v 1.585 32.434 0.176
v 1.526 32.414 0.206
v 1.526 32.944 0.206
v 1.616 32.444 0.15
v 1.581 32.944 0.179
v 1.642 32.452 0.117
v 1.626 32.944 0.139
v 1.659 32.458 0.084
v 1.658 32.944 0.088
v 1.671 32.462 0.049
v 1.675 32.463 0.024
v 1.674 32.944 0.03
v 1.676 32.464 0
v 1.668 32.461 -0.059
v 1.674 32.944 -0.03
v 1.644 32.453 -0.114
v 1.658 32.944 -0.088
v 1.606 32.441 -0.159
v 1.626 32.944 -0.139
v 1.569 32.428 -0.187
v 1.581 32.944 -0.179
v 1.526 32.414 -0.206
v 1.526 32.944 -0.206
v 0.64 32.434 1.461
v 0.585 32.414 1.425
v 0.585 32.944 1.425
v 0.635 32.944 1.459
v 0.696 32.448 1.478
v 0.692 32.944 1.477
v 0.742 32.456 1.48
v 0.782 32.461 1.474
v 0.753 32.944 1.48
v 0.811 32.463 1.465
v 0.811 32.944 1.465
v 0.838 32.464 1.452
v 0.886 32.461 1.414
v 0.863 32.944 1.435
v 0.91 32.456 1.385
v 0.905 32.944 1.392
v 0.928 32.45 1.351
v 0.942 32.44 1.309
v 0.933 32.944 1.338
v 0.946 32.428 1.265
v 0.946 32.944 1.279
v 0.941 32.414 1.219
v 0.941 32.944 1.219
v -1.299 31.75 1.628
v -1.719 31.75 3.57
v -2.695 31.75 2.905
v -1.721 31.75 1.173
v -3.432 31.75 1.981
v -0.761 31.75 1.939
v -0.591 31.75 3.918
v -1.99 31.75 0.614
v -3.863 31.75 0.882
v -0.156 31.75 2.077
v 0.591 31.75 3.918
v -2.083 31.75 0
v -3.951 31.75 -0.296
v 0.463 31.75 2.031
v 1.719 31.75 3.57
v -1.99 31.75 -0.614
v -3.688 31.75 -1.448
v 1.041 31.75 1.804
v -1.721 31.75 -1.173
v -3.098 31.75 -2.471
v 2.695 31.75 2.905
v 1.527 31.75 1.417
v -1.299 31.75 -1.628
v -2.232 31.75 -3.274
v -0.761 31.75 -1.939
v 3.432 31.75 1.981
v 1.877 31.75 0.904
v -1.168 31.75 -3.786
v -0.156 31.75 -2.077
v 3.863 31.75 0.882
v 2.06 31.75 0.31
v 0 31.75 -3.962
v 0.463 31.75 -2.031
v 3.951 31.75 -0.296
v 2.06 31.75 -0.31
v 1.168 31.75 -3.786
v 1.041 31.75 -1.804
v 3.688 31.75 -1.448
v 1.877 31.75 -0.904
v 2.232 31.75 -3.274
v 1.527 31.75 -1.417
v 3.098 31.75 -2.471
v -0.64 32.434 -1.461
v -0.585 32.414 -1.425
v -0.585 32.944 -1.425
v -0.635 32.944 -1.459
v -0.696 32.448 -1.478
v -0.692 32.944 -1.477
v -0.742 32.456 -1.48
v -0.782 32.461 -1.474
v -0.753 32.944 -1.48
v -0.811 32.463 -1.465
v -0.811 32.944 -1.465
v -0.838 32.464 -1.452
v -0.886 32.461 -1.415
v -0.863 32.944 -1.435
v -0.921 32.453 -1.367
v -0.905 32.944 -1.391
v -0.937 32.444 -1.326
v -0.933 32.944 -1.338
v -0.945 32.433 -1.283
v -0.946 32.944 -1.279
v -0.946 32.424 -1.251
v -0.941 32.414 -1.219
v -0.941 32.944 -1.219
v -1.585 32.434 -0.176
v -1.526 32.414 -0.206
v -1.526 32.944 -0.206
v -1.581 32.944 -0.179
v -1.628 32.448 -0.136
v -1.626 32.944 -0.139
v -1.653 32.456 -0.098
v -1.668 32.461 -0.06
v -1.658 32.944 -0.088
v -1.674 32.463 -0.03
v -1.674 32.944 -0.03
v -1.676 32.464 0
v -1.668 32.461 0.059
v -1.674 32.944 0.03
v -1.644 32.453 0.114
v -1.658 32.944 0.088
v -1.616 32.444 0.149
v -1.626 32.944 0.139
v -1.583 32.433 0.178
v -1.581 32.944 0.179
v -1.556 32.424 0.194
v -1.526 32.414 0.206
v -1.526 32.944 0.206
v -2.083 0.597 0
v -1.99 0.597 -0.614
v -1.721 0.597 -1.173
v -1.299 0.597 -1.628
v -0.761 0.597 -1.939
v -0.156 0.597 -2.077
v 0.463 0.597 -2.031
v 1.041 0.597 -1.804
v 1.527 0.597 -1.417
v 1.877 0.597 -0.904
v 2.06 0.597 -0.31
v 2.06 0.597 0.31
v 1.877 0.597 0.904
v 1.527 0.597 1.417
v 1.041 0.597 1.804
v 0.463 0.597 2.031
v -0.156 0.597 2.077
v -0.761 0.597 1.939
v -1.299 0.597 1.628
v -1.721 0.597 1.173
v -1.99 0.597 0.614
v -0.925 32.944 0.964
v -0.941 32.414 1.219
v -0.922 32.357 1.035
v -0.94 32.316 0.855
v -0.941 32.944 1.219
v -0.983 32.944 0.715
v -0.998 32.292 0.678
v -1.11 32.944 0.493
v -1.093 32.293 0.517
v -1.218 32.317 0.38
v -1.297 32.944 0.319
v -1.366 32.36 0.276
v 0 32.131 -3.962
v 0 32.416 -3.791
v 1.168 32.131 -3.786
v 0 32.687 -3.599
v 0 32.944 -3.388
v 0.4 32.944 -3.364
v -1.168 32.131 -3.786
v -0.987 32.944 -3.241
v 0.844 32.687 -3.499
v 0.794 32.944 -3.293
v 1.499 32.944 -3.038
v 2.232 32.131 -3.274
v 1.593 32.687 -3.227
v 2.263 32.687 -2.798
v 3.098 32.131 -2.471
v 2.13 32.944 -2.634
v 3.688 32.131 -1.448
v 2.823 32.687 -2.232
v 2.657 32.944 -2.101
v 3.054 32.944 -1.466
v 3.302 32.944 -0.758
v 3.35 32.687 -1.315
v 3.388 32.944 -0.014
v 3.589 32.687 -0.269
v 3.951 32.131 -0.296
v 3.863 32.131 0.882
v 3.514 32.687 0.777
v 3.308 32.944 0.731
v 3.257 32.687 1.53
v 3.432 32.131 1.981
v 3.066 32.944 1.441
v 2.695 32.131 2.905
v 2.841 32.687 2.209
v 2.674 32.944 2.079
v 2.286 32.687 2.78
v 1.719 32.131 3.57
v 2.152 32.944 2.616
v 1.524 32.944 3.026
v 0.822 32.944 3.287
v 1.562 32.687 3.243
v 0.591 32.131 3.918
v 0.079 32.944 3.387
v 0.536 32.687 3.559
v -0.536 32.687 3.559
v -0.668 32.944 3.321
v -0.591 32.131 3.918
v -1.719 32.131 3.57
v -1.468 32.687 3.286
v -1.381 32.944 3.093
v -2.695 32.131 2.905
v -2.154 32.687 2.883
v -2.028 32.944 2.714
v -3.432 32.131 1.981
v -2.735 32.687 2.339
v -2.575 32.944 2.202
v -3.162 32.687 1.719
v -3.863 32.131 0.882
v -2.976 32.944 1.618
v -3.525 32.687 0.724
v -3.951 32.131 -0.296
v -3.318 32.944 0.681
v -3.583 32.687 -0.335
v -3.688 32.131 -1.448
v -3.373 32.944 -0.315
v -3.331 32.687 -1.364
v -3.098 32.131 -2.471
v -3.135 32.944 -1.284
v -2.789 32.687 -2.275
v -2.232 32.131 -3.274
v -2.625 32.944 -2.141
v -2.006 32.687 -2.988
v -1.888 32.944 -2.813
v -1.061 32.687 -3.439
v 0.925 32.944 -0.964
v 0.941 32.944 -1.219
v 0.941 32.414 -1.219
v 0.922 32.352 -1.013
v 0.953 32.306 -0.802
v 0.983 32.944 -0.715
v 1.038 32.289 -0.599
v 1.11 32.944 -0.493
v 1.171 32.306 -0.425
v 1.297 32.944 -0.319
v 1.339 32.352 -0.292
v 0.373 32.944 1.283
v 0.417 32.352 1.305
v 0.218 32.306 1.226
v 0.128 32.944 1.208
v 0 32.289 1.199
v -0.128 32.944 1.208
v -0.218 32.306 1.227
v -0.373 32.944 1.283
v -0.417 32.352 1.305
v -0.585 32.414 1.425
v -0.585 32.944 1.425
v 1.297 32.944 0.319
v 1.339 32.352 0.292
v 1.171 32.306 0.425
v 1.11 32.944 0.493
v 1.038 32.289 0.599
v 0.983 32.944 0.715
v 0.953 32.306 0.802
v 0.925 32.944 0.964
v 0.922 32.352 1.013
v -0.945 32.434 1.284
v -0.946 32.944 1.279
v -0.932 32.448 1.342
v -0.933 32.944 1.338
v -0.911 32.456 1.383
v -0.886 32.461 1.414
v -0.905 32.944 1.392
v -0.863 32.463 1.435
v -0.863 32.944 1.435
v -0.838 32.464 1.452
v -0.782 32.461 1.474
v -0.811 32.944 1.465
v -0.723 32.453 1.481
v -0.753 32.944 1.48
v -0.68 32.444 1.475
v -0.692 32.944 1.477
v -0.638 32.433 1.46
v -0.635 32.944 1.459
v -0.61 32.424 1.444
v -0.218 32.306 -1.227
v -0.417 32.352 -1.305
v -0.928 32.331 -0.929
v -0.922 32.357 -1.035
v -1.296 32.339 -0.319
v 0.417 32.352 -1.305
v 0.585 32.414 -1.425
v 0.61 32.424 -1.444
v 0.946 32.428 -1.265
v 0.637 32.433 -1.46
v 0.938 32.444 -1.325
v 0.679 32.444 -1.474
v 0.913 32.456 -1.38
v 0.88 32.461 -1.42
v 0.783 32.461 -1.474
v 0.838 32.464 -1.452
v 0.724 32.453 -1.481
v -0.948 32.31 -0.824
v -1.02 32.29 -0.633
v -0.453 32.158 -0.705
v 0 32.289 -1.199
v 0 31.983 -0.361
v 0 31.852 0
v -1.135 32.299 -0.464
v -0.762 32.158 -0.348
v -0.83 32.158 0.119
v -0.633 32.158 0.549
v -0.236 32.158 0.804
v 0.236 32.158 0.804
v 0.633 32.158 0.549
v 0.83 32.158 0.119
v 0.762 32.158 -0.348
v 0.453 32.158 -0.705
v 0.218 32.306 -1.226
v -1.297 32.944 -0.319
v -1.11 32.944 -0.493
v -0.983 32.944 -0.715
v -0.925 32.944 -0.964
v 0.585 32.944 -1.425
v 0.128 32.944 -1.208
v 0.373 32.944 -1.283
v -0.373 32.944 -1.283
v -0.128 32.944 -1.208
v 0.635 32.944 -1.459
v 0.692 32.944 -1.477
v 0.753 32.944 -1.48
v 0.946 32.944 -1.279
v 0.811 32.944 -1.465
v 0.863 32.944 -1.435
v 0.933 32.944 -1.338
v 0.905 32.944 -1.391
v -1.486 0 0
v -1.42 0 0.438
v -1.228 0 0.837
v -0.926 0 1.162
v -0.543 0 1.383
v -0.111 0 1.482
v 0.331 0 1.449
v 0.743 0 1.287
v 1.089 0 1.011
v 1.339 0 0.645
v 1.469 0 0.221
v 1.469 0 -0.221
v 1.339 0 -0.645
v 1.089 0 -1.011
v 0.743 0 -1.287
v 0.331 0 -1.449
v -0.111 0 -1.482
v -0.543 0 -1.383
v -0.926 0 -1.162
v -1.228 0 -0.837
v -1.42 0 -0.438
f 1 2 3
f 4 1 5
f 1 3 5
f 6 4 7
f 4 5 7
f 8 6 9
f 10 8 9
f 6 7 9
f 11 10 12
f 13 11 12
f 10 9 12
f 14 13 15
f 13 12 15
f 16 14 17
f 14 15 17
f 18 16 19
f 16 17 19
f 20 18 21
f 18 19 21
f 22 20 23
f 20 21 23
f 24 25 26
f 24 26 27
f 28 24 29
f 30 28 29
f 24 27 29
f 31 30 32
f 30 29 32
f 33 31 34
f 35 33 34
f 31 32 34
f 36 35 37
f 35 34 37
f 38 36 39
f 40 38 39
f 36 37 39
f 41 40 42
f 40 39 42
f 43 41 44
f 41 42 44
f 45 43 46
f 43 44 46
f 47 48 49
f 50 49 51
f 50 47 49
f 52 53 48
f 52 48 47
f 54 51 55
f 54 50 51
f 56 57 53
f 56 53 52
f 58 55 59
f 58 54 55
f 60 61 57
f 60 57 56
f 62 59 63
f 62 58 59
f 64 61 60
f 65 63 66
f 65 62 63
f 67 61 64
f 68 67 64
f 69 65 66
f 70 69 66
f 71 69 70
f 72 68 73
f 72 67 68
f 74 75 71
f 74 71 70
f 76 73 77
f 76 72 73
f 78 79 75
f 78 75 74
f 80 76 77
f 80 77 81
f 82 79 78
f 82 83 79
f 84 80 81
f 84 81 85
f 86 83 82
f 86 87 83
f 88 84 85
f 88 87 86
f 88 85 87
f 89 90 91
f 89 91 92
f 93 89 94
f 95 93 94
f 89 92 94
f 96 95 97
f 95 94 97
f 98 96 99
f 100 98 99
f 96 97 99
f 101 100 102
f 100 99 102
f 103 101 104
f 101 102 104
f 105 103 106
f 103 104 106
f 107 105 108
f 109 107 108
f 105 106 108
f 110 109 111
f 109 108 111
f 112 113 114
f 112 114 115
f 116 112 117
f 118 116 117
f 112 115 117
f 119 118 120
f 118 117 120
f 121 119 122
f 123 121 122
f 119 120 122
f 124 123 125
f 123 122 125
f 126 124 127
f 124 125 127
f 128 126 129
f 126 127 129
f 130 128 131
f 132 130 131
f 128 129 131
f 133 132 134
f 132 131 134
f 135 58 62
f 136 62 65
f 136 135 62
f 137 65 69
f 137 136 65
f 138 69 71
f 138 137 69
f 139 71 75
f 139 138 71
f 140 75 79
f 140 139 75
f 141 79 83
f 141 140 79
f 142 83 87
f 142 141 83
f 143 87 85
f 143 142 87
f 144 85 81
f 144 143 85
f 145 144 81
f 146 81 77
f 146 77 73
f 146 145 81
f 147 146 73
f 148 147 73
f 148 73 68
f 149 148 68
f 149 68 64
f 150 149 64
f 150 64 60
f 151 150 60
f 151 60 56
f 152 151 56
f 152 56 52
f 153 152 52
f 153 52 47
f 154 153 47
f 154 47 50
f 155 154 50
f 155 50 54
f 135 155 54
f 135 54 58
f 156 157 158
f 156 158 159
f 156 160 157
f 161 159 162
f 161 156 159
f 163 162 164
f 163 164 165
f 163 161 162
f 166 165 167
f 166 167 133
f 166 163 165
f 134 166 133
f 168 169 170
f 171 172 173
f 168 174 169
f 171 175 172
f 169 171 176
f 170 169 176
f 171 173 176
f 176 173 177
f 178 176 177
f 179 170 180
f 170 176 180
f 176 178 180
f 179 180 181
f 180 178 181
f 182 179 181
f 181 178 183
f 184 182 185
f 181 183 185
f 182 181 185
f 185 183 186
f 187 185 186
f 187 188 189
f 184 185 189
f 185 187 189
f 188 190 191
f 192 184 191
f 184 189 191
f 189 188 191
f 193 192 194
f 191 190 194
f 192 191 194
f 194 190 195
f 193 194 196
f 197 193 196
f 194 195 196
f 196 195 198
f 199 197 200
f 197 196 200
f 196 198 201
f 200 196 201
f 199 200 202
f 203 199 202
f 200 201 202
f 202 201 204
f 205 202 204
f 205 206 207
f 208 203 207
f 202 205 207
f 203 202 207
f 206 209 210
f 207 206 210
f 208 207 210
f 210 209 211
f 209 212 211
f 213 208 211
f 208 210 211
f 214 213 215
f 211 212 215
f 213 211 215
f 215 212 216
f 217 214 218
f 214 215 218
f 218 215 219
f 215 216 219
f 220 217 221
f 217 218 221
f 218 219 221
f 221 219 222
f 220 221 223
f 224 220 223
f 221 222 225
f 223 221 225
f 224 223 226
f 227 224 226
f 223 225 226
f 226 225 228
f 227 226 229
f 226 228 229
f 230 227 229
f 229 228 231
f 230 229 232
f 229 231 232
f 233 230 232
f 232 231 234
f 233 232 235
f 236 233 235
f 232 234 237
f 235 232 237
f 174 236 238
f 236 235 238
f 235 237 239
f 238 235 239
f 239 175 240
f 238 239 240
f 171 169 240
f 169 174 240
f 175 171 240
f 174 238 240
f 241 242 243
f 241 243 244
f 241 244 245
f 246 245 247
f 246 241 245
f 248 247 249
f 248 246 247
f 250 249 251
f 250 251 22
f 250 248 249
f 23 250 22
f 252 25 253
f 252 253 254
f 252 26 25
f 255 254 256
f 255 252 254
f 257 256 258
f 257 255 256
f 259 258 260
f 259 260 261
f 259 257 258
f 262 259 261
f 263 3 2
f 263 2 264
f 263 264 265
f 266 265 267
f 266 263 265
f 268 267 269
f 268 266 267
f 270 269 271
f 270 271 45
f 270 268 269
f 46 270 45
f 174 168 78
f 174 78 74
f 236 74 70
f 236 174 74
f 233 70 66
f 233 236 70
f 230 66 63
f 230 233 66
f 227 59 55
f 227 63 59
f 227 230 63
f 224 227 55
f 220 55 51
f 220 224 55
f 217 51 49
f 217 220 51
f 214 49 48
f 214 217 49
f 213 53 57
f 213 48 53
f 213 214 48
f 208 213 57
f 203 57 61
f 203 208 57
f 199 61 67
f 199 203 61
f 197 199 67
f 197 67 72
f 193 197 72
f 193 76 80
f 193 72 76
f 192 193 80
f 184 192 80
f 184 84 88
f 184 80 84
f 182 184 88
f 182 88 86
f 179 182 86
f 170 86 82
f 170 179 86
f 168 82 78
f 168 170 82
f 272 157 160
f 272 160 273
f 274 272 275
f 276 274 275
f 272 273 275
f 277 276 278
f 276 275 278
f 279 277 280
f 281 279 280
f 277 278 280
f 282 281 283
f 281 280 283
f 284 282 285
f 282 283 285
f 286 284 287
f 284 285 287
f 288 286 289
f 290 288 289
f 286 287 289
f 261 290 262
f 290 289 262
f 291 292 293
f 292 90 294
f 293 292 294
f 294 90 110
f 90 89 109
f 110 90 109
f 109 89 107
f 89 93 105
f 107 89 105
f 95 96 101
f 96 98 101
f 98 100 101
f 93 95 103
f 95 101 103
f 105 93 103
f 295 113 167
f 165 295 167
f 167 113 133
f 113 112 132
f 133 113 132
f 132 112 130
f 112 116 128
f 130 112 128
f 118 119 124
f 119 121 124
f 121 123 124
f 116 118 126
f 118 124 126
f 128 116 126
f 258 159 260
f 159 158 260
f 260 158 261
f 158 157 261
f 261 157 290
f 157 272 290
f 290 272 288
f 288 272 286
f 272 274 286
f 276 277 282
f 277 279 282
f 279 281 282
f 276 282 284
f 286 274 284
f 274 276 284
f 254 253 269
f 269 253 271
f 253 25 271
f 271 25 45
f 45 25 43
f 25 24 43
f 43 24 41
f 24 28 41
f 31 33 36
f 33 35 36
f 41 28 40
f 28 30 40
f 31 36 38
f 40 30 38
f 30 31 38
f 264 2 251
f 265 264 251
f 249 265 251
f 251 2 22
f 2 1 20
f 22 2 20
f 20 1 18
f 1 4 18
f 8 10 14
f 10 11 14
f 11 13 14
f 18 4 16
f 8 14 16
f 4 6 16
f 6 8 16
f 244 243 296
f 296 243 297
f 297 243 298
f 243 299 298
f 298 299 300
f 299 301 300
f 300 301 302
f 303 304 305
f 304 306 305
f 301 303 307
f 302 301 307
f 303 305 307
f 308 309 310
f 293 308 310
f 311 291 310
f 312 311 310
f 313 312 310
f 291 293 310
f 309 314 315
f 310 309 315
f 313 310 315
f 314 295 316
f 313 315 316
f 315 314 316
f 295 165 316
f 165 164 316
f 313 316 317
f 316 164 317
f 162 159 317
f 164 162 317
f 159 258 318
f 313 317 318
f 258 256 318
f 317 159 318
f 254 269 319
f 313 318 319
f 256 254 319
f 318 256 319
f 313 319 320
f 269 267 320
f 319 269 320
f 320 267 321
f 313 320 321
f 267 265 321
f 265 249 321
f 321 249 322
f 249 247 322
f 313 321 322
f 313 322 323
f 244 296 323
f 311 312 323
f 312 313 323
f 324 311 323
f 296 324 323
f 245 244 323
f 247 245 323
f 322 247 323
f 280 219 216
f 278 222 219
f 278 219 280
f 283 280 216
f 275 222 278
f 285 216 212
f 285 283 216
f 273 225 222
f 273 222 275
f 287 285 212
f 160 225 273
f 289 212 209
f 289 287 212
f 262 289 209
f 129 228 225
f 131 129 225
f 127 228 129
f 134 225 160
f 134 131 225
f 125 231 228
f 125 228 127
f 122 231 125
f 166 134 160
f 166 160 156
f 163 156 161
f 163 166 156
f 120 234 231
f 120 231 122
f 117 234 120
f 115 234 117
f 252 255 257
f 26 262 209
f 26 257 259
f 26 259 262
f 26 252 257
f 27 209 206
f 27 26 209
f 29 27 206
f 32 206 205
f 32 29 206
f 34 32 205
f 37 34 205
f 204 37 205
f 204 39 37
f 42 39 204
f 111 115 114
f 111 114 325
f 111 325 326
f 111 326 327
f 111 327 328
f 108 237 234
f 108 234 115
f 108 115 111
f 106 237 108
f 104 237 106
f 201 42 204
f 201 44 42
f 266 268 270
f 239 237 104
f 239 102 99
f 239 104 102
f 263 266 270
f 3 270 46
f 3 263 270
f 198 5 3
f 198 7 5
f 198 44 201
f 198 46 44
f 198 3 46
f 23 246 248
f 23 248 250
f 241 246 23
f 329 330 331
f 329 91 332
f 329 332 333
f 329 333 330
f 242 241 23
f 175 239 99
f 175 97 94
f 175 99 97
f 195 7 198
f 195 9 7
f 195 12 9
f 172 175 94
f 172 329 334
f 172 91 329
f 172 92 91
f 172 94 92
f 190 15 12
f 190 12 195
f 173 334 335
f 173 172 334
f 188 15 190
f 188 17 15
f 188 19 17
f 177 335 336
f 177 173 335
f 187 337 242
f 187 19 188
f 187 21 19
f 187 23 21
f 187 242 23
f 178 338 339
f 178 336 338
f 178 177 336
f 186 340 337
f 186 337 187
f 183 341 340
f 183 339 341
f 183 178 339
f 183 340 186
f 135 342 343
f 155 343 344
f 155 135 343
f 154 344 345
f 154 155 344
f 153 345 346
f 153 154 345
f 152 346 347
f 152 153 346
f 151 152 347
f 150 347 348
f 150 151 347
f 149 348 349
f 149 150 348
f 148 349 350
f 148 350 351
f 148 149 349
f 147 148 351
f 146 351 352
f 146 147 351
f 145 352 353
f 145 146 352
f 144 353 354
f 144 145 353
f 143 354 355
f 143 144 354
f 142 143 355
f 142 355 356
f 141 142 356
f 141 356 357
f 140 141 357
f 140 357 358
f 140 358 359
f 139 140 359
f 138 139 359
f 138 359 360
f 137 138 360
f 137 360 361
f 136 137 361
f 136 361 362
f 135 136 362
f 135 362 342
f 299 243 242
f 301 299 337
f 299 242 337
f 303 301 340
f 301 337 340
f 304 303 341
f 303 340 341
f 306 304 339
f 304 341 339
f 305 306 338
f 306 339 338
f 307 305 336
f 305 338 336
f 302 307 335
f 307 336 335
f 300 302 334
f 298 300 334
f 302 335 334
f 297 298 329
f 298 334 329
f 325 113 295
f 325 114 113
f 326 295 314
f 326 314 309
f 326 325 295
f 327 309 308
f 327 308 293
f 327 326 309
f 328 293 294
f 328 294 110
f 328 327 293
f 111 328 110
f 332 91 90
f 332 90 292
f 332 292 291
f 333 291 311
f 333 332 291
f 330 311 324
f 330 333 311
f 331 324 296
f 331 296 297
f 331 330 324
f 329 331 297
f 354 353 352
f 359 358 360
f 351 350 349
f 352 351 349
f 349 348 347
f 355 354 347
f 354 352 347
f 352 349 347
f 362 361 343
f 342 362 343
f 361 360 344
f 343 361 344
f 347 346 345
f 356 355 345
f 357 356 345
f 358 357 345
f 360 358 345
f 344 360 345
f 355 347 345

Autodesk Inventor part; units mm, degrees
ref_plane "YZ Plane" through (0, 0, 0) normal (1, 0, 0) x (0, 1, 0)
ref_plane "XZ Plane" through (0, 0, 0) normal (0, 1, 0) x (-1, 0, 0)
ref_plane "XY Plane" through (0, 0, 0) normal (0, 0, 1) x (1, 0, 0)
sketch "Sketch1" plane through (0, 0, 0) normal (0, 1, 0) x (-1, 0, 0)
  circle A0 centre (0, 0) radius 2.0828
  dimension "d4" = 4.1656
extrude "Body" add sketch "Sketch1" along normal blind 31.75
sketch "Sketch2" plane through (0, 0, 0) normal (1, 0, 0) x (0, 1, 0)
  line L0 (31.75, -2.0828) -> (31.75, 2.0828) projected
  line L1 (31.75, 0) -> (31.75, -3.9624)
  line L2 (31.75, -3.9624) -> (32.131, -3.9624)
  arc A0 (32.131, -3.9624) -> (33.9598, -2.0828) centre (29.9388, 0) ccw
  line L3 (33.9598, -2.0828) -> (33.9598, -1.6764)
  line L4 (33.9598, -1.6764) -> (32.4635, -1.6764)
  line L5 (32.4635, -1.6764) -> (31.8516, 0)
  line L6 (31.8516, 0) -> (31.75, 0)
  point P0 (0, 0)
  dimension "d5" = 3.9624
  dimension "d6" = 0.381
  dimension "d13" = 0.1016
  dimension "d14" = 2.0828
  dimension "d15" = 2.2098
  dimension "d16" = 0
  dimension "d17" = 1.6764
  dimension "d57" = 20.053
revolve "Head" add sketch "Sketch2" angle 360 about axis through (0, 31.8516, 0) along (0, -1, 0)
sketch "Sketch3" plane through (0, 33.9598, 0) normal (0, 1, 0) x (1, 0, 0)
  circle A0 centre (0, 0) radius 1.6764 projected
  line L0 (0.7302, -1.2648) -> (-0.7303, -1.2648) construction
  line L1 (-0.7303, -1.2648) -> (-1.4605, 0) construction
  line L2 (-1.4605, 0) -> (-0.7303, 1.2648) construction
  line L3 (-0.7303, 1.2648) -> (0.7302, 1.2648) construction
  line L4 (0.7302, 1.2648) -> (1.4605, 0) construction
  line L5 (1.4605, 0) -> (0.7302, -1.2648) construction
  circle A1 centre (-0.7303, -1.2648) radius 0.2159
  circle A2 centre (-1.4605, 0) radius 0.2159
  circle A3 centre (-0.7303, 1.2648) radius 0.2159
  circle A4 centre (0.7302, 1.2648) radius 0.2159
  circle A5 centre (1.4605, 0) radius 0.2159
  circle A6 centre (0.7302, -1.2648) radius 0.2159
  circle A7 centre (0, -2.0701) radius 0.8712
  circle A8 centre (0, 2.0701) radius 0.8712
  circle A9 centre (1.7928, -1.0351) radius 0.8712
  circle A10 centre (-1.7928, 1.035) radius 0.8712
  circle A11 centre (1.7928, 1.035) radius 0.8712
  circle A12 centre (-1.7928, -1.0351) radius 0.8712
  circle A13 centre (0, 0) radius 1.8188
  point P0 (0, 0)
  point P1 (0, 0)
  point P2 (0.9413, 1.2192)
  point P3 (1.5265, 0.2056)
  point P4 (1.5265, -0.2056)
  point P5 (0.9413, -1.2192)
  point P6 (0.5852, -1.4248)
  point P7 (-0.5852, -1.4248)
  point P8 (-0.9413, -1.2192)
  point P9 (-1.5265, -0.2056)
  point P10 (-1.5265, 0.2056)
  point P11 (-0.9413, 1.2192)
  point P12 (-0.5852, 1.4248)
  point P13 (0.5852, 1.4248)
  dimension "d58" = 2.921
  dimension "d59" = 4.1402
  dimension "d62" = 120
extrude "Hex" add sketch "Sketch3" against normal blind 1.778 contours A5 A11 A0 | A0 A11 A13 A9 | A0 A9 A5 | A11 A0 | A0 A11 A13 | A9 A13 A0 | A0 A9 | A11 A4 A0 | A0 A8 A13 A11 | A9 A13 A7 A0 | A0 A6 A9 | A4 A8 A0 | A0 A7 A6 | A8 A0 | A7 A0 | A0 A8 A13 | A7 A13 A0 | A3 A0 A8 | A7 A0 A1 | A0 A10 A13 A8 | A7 A13 A12 A0 | A3 A10 A0 | A0 A12 A1 | A10 A0 A13 | A13 A12 A0 | A10 A0 | A0 A12 | A10 A0 A12 A13 | A10 A2 A0 | A0 A2 A12
sketch "Sketch4" plane through (0, 0, 0) normal (0, 0, 1) x (1, 0, 0)
  line L0 (-0.7364, 33.0198) -> (-1.6764, 33.9598)
  line L1 (0, 33.9598) -> (-0.7364, 33.0198)
  line L2 (0, -9.332) -> (0, 55.9918) projected
  line L3 (-1.5265, 33.9598) -> (-1.5265, 32.4138) projected
  line L4 (-1.5265, 33.9598) -> (-1.5265, 33.9598) projected
  line L5 (-1.5265, 33.9598) -> (-1.5265, 32.4138) projected
  line L6 (-1.6764, 33.9598) -> (-1.5265, 33.9598) projected
  line L7 (-1.6764, 33.9598) -> (0, 33.9598)
  point P0 (0, 0)
  point P1 (-1.6764, 32.4635)
  dimension "d29" = 1.6764
revolve "Head Chamfer" cut sketch "Sketch4" angle 360 about axis through (0, -10, 0) along (0, 1, 0)
feature "Thread" [suppressed]
sketch "Sketch6" plane through (0, 0, 0) normal (0, 0, 1) x (1, 0, 0)
  line L0 (0, 0) -> (-1.4859, 0)
  line L1 (2.0828, 0) -> (-2.0828, 0) projected
  line L2 (-1.4859, 0) -> (-2.4948, 1.0089)
  line L3 (-2.4948, 1.0089) -> (-2.9651, -1.2188)
  line L4 (-2.9651, -1.2188) -> (-1.4859, -1.2188)
  line L5 (-2.0828, 0) -> (-2.0828, 31.75) projected
  line L6 (-1.4859, -1.2188) -> (-1.4859, 0)
  line L7 (0, -10.3526) -> (0, 53.5838) projected
  point P0 (-2.0828, 0.5969)
  dimension "d49" = 1.4859
  dimension "d50" = 135
revolve "Tapered End" cut sketch "Sketch6" angle 360 about axis through (0, -10, 0) along (0, 1, 0)
sketch "Sketch8" plane through (0, 33.9598, 0) normal (0, 1, 0) x (1, 0, 0)
  circle A0 centre (0, 0) radius 4.7625
  point P0 (0, 0)
extrude "Extrusion3" cut sketch "Sketch8" against normal blind 1.016
sketch "Sketch5" plane through (0, 0, 0) normal (1, 0, 0) x (0, 1, 0)
  line L0 (0, -2.0828) -> (31.75, -2.0828) projected
  line L1 (31.75, 3.9624) -> (31.75, -3.9624) projected
  line L2 (31.75, -2.0828) -> (31.75, 2.0828) projected
  line L3 (0.0745, -2.0828) -> (-0.2261, -2.6035)
  line L4 (-0.2261, -2.6035) -> (-0.3253, -2.6035)
  line L5 (-0.3253, -2.6035) -> (-0.626, -2.0828)
  line L6 (0.0686, -2.6035) -> (-0.7252, -2.6035) construction
  line L7 (-0.626, -2.0828) -> (0.0745, -2.0828)
  line L8 (0, -2.0828) -> (31.75, -2.0828) projected
  point P0 (0, 0)
  dimension "d31" = 30
  dimension "d32" = 60
  dimension "a" = 0.0992
  dimension "d46" = 0.7937
  dimension "d54" = 0.0686
  dimension "d55" = 0.5207
  dimension "d56" = 0.0992
equation "\"d56\" = a"
properties part number "Screw 8-32 Steel 2.500" material "VEX Steel"
